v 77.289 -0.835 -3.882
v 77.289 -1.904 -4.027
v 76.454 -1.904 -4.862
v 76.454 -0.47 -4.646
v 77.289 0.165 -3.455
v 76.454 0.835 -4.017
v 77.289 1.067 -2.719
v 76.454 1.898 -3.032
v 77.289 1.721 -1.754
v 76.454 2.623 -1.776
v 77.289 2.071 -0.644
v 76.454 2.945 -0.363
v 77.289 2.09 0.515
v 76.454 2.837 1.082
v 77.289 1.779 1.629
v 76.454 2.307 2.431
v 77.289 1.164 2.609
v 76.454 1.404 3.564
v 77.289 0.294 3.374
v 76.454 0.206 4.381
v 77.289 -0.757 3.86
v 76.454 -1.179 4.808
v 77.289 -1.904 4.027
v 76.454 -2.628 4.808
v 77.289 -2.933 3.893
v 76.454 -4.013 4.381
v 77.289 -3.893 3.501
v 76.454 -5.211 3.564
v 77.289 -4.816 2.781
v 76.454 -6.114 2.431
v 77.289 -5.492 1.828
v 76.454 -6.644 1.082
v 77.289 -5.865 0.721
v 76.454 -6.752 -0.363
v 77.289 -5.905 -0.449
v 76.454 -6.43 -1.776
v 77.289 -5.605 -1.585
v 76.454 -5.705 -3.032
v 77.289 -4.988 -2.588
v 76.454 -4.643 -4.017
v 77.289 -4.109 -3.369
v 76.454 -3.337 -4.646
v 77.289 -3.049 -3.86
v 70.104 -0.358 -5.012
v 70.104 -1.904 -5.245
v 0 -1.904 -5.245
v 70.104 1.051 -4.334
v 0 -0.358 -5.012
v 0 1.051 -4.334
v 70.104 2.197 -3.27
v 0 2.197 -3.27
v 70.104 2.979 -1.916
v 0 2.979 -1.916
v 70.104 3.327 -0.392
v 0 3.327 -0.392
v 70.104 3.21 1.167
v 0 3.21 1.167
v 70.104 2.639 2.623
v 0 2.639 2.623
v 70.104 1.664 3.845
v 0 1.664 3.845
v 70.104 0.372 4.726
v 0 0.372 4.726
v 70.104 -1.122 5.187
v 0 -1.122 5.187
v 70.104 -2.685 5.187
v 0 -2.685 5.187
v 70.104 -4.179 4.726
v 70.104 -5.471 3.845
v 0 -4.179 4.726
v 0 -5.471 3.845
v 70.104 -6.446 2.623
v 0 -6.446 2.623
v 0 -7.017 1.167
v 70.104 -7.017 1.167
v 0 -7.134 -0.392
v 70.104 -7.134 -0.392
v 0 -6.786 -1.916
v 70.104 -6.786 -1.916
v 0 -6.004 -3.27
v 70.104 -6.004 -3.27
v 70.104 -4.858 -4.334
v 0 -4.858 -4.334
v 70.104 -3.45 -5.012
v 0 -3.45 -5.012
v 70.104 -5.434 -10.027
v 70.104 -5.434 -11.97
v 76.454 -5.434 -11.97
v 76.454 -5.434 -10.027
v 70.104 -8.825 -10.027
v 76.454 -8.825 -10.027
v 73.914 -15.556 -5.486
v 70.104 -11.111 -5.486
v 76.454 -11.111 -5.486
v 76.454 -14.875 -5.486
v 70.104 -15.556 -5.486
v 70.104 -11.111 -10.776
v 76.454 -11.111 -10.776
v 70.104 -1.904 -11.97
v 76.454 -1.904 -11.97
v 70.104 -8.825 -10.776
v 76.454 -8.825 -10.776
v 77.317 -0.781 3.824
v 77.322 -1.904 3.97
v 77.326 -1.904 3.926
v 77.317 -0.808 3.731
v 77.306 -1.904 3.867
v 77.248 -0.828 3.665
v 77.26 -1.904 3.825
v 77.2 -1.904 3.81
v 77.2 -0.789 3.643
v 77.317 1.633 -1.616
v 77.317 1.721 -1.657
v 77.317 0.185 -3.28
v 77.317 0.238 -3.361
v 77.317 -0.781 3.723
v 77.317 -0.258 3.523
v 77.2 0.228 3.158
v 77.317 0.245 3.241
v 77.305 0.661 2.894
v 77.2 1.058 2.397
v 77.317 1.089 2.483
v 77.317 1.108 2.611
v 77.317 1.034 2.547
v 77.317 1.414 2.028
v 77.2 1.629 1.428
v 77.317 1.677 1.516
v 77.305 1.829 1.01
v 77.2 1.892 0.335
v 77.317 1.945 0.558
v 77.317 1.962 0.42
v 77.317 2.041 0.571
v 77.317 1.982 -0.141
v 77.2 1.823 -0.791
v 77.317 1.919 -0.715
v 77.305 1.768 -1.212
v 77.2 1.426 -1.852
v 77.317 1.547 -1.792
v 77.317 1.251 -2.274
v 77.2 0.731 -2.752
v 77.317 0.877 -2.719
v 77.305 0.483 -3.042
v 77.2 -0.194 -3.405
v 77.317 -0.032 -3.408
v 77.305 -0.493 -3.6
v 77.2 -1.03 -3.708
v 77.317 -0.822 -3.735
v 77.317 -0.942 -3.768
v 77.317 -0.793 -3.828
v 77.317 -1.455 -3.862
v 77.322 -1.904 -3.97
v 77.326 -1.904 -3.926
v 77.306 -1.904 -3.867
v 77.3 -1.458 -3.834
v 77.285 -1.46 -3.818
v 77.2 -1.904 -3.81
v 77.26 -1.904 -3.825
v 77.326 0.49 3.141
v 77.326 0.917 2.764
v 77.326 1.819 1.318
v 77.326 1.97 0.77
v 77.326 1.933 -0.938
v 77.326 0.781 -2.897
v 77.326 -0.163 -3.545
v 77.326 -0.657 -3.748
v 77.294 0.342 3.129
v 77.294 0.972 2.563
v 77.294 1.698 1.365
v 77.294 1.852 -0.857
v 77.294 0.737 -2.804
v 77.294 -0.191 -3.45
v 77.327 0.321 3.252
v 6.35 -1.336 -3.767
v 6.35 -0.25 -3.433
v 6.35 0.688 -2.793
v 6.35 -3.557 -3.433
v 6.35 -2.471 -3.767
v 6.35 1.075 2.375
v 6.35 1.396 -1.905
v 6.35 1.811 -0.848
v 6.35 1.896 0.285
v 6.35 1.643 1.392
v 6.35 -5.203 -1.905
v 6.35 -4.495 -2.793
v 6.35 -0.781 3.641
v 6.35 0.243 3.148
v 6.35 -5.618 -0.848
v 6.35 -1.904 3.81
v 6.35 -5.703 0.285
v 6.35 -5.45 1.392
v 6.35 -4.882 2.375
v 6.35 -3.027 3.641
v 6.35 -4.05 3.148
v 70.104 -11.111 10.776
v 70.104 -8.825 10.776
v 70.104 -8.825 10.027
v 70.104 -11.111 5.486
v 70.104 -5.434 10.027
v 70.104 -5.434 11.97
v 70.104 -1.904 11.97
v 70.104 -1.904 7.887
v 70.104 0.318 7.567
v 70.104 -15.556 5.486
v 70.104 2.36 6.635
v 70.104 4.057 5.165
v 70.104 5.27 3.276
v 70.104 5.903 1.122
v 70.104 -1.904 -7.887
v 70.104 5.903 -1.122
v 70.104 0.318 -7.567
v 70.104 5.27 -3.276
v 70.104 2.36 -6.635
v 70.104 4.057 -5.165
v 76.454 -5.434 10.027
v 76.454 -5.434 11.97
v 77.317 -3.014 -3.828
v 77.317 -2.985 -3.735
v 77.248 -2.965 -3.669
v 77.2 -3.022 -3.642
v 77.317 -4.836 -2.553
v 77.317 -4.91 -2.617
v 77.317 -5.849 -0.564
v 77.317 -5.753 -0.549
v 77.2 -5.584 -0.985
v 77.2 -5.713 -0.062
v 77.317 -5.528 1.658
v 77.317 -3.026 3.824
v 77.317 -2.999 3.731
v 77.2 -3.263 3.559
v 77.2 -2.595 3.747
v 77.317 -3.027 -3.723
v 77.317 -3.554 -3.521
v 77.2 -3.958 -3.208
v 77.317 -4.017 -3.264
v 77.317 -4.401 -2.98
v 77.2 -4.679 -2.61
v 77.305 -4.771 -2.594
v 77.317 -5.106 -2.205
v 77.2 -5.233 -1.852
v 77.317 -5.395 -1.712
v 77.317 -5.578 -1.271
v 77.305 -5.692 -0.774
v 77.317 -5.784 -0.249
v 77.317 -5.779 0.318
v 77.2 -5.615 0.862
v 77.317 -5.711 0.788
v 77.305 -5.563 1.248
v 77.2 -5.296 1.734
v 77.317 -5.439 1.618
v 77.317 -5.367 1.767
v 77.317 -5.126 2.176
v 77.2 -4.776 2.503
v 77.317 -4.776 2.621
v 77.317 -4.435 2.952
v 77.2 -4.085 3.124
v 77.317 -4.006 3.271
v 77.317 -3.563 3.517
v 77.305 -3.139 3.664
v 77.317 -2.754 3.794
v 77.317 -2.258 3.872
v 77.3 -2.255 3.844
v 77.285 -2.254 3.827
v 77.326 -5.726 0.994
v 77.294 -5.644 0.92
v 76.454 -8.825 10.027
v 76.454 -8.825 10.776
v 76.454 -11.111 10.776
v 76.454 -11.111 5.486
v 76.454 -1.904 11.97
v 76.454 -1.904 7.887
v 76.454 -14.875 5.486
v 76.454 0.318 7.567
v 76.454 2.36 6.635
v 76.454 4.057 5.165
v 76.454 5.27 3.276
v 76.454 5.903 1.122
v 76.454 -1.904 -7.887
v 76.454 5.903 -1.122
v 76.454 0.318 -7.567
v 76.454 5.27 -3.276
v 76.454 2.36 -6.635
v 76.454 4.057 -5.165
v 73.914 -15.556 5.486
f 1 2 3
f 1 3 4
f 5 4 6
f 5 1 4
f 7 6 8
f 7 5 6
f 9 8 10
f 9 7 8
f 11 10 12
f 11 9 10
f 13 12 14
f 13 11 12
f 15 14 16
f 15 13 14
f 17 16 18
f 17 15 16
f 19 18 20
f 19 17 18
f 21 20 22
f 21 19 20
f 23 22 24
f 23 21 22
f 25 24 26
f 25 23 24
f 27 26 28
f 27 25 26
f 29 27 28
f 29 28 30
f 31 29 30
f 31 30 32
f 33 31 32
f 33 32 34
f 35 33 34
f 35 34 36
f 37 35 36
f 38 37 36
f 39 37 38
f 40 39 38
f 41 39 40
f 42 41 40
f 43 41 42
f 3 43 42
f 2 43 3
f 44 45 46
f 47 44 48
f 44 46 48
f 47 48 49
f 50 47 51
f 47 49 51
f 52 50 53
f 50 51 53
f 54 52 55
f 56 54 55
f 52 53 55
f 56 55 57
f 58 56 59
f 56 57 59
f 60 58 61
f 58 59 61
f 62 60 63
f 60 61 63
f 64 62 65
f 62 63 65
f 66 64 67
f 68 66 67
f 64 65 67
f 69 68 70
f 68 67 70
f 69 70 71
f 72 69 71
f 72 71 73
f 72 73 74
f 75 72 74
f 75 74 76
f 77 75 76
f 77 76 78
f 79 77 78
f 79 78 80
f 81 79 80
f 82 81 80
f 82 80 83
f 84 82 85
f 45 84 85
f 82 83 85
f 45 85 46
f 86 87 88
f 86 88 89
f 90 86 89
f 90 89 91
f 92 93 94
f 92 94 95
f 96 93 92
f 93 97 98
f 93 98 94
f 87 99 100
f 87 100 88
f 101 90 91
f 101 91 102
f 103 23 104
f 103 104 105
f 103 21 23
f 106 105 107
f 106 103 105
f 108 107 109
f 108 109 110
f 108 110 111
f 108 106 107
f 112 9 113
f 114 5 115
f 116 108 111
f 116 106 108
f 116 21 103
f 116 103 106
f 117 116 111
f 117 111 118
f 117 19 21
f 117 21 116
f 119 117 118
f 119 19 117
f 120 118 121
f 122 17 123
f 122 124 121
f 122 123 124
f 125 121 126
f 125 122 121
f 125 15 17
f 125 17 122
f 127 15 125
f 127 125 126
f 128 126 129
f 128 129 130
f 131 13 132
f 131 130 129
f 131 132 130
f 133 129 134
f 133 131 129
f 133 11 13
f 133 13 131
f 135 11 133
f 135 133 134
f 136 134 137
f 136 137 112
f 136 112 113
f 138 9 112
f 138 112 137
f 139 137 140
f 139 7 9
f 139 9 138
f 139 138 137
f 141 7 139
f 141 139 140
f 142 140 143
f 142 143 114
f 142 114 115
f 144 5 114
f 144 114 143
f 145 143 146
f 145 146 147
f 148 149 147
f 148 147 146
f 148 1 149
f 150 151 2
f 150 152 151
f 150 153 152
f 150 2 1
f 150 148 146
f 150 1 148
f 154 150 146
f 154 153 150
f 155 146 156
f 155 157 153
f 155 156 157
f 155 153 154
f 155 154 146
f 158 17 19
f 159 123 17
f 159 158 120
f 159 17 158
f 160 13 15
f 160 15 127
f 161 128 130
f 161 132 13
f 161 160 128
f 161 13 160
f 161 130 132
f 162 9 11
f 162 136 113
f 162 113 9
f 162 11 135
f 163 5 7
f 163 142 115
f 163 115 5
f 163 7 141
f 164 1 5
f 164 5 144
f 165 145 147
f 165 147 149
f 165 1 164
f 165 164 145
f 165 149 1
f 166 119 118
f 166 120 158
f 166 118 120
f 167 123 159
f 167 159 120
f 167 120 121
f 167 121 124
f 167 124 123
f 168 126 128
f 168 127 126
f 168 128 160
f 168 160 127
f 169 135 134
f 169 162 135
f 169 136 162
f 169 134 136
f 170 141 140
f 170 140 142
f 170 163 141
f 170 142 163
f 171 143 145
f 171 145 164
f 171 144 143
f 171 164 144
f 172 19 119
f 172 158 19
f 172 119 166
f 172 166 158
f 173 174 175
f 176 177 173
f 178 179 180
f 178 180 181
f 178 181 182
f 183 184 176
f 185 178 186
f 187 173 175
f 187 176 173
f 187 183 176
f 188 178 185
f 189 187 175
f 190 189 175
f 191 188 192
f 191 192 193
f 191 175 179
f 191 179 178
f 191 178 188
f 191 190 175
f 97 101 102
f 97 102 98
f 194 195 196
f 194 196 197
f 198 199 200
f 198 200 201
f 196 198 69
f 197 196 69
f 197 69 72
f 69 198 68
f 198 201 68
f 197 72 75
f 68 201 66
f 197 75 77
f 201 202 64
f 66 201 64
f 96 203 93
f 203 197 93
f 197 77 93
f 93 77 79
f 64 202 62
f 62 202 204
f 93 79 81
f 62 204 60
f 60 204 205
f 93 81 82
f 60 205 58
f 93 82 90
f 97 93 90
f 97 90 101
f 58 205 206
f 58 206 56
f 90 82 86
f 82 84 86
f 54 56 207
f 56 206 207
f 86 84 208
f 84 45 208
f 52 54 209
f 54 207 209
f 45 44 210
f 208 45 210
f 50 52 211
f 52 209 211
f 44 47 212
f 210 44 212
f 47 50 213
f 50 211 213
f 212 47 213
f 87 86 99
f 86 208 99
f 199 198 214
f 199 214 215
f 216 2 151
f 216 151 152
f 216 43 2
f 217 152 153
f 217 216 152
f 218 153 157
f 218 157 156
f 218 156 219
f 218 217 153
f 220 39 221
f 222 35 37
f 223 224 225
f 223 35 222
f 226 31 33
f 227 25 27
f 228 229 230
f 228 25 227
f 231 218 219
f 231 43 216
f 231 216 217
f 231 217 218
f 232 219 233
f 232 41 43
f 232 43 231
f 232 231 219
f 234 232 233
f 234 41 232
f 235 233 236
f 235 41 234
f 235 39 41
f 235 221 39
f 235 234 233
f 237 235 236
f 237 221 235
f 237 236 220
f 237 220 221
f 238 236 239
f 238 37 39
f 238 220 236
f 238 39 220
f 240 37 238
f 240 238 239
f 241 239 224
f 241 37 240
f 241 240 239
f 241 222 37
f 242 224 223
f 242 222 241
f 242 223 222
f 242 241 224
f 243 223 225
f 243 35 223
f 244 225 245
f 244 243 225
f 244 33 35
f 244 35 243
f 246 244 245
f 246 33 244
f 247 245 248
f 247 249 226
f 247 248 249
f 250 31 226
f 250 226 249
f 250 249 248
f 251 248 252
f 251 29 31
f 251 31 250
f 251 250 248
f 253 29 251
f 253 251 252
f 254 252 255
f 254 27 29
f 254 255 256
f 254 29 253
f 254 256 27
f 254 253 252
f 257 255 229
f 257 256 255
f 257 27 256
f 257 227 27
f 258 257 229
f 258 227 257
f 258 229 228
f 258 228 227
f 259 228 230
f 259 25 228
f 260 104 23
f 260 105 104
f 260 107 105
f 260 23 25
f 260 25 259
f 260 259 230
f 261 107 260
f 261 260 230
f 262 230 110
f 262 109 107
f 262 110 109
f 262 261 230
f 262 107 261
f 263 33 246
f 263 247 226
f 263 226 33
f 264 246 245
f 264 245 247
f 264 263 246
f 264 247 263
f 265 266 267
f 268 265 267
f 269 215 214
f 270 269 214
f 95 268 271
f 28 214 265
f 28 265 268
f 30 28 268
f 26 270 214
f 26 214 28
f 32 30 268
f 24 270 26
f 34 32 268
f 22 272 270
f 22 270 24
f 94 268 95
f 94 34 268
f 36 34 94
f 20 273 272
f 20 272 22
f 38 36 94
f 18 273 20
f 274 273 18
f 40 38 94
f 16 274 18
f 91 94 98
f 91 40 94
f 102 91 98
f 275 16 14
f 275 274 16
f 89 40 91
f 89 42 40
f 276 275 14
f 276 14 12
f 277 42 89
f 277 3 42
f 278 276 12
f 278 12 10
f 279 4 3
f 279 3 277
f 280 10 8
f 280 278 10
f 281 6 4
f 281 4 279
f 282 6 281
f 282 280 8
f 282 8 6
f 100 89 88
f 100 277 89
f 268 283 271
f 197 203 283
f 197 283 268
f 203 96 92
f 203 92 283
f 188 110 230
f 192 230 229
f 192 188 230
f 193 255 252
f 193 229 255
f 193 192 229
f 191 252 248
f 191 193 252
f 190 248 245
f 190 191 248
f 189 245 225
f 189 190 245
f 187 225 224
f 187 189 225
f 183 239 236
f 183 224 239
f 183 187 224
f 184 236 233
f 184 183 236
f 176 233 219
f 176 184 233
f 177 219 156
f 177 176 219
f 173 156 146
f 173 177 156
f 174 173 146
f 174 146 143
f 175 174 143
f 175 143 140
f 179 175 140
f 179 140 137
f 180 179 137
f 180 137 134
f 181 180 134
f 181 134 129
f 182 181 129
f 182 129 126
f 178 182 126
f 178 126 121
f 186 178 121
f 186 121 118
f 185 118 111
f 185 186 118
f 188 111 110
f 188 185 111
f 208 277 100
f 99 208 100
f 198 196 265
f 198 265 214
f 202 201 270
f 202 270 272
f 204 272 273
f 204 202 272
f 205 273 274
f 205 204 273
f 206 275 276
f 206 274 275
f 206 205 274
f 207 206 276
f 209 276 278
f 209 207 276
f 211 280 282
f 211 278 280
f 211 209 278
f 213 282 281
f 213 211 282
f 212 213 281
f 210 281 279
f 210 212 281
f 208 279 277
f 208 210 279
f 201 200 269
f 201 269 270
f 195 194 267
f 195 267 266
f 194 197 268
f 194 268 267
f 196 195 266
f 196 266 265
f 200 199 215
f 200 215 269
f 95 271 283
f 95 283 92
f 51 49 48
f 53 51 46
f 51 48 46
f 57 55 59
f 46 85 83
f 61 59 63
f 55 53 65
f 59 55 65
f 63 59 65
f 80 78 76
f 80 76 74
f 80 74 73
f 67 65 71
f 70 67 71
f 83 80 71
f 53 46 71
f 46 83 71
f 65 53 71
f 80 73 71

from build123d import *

# Parameters (mm, degrees)
SKETCH1_R           = 3.81
BOSS_EXTRUDE1_DEPTH = 77.724
SKETCH3_R           = 3.81
BOSS_EXTRUDE2_DEPTH = 6.35
SKETCH2_W           = 36.763821928
SKETCH2_H           = 29.567130372
SKETCH2_R           = 5.2451
CUT_EXTRUDE2_DEPTH  = 70.104
CUT_EXTRUDE3_START  = -1.27
SKETCH4_R           = 4.862249437
CUT_EXTRUDE3_DEPTH  = 1.27
CHAMFER1_SIZE       = 1.27
FILLET1_R           = 0.127
CHAMFER2_SIZE       = 2.54
CHAMFER2_SIZE2      = 0.680590949


with BuildPart() as part:
    # Sketch1 → Boss-Extrude1 (new body)
    with BuildSketch(Plane(origin=(0, 0, 0), x_dir=(0, 0, -1), z_dir=(1, 0, 0))):
        with BuildLine():
            Line((5.4864, -15.556063849), (-5.4864, -15.556063849))
            Line((-5.4864, -15.556063849), (-5.4864, -11.111063849))
            Line((-5.4864, -11.111063849), (-10.77595, -11.111063849))
            Line((-10.77595, -11.111063849), (-10.77595, -8.825063849))
            Line((-10.77595, -8.825063849), (-10.02746492, -8.825063849))
            Line((-10.02746492, -8.825063849), (-10.02746492, -5.434163849))
            Line((-10.02746492, -5.434163849), (-11.96975, -5.434163849))
            Line((-11.96975, -5.434163849), (-11.96975, -1.903563849))
            Line((-11.96975, -1.903563849), (-7.8867, -1.903563849))
            ThreePointArc((-7.8867, -1.903563849), (0, 5.983136151), (7.8867, -1.903563849))
            Line((7.8867, -1.903563849), (11.96975, -1.903563849))
            Line((11.96975, -1.903563849), (11.96975, -5.434163849))
            Line((11.96975, -5.434163849), (10.02746492, -5.434163849))
            Line((10.02746492, -5.434163849), (10.02746492, -8.825063849))
            Line((10.02746492, -8.825063849), (10.77595, -8.825063849))
            Line((10.77595, -8.825063849), (10.77595, -11.111063849))
            Line((10.77595, -11.111063849), (5.4864, -11.111063849))
            Line((5.4864, -11.111063849), (5.4864, -15.556063849))
        make_face()
        with Locations(Location((0, -1.903563849, 0), (0, 0, 180))):
            Circle(SKETCH1_R, mode=Mode.SUBTRACT)
    extrude(amount=BOSS_EXTRUDE1_DEPTH)

    # Sketch3 → Boss-Extrude2 (add)
    with BuildSketch(Plane(origin=(0, 0, 0), x_dir=(0, 0, -1), z_dir=(1, 0, 0))):
        with Locations(Location((0, -1.903563849, 0), (0, 0, 180))):
            Circle(SKETCH3_R)
    extrude(amount=BOSS_EXTRUDE2_DEPTH)

    # Sketch2 → Cut-Extrude2 (cut)
    with BuildSketch(Plane(origin=(0, 0, 0), x_dir=(0, 0, -1), z_dir=(1, 0, 0))):
        with Locations((-1.560728289, -3.789331886)):
            Rectangle(SKETCH2_W, SKETCH2_H)
        with Locations((0, -1.903563849)):
            Circle(SKETCH2_R, mode=Mode.SUBTRACT)
    extrude(amount=CUT_EXTRUDE2_DEPTH, mode=Mode.SUBTRACT)

    # Sketch4 → Cut-Extrude3 (cut)
    with BuildSketch(Plane(origin=(77.724, 0, 0), x_dir=(0, 0, -1), z_dir=(1, 0, 0)).offset(CUT_EXTRUDE3_START)):
        with BuildLine():
            Line((11.96975, -1.903563849), (7.8867, -1.903563849))
            ThreePointArc((7.8867, -1.903563849), (0, 5.983136151), (-7.8867, -1.903563849))
            Line((-7.8867, -1.903563849), (-11.96975, -1.903563849))
            Line((-11.96975, -1.903563849), (-11.96975, -5.434163849))
            Line((-11.96975, -5.434163849), (-10.02746492, -5.434163849))
            Line((-10.02746492, -5.434163849), (-10.02746492, -8.825063849))
            Line((-10.02746492, -8.825063849), (-10.77595, -8.825063849))
            Line((-10.77595, -8.825063849), (-10.77595, -11.111063849))
            Line((-10.77595, -11.111063849), (-5.4864, -11.111063849))
            Line((-5.4864, -11.111063849), (-5.4864, -15.556063849))
            Line((-5.4864, -15.556063849), (5.4864, -15.556063849))
            Line((5.4864, -15.556063849), (5.4864, -11.111063849))
            Line((5.4864, -11.111063849), (10.77595, -11.111063849))
            Line((10.77595, -11.111063849), (10.77595, -8.825063849))
            Line((10.77595, -8.825063849), (10.02746492, -8.825063849))
            Line((10.02746492, -8.825063849), (10.02746492, -5.434163849))
            Line((10.02746492, -5.434163849), (11.96975, -5.434163849))
            Line((11.96975, -5.434163849), (11.96975, -1.903563849))
        make_face()
        with Locations((0, -1.903563849)):
            Circle(SKETCH4_R, mode=Mode.SUBTRACT)
    extrude(amount=CUT_EXTRUDE3_DEPTH, mode=Mode.SUBTRACT)

    # Chamfer1
    # the kernel refuses this chamfer: 1.27 mm, written as the material it takes off along each edge
    with BuildSketch(Plane(origin=(77.724, -1.903563849, 0), x_dir=(0, 0, -1), z_dir=(0, -1, 0))) as chamfer1_piece_1_section:
        Polygon((4.862249437, -CHAMFER1_SIZE), (4.862249437 - CHAMFER1_SIZE, 0), (4.862249437, 0), align=None)
    chamfer1_piece_1 = revolve(axis=Axis((77.724, -1.903563849, 0), (1, 0, 0)), mode=Mode.PRIVATE)
    chamfer1_piece_1 = split(chamfer1_piece_1, bisect_by=Plane(origin=(76.454, -1.903563849, 4.22989024), z_dir=(1, 0, 0)), keep=Keep.TOP, mode=Mode.PRIVATE)
    add(chamfer1_piece_1, mode=Mode.SUBTRACT)

    # Fillet1
    fillet1_edges = [part.edges().sort_by_distance(p)[0] for p in [
        (77.506249437, 1.906436151, 0),
    ]]
    fillet(fillet1_edges, radius=FILLET1_R)

    # Chamfer2
    chamfer2_edges = [part.edges().sort_by_distance(p)[0] for p in [
        (76.454, -15.556063849, 0),
    ]]
    chamfer2_side = [part.faces().sort_by_distance(p)[0] for p in [
        (73.279, -15.556063849, 0),
    ]]
    chamfer(chamfer2_edges, length=CHAMFER2_SIZE, length2=CHAMFER2_SIZE2, reference=chamfer2_side[0])


solid = part.part
